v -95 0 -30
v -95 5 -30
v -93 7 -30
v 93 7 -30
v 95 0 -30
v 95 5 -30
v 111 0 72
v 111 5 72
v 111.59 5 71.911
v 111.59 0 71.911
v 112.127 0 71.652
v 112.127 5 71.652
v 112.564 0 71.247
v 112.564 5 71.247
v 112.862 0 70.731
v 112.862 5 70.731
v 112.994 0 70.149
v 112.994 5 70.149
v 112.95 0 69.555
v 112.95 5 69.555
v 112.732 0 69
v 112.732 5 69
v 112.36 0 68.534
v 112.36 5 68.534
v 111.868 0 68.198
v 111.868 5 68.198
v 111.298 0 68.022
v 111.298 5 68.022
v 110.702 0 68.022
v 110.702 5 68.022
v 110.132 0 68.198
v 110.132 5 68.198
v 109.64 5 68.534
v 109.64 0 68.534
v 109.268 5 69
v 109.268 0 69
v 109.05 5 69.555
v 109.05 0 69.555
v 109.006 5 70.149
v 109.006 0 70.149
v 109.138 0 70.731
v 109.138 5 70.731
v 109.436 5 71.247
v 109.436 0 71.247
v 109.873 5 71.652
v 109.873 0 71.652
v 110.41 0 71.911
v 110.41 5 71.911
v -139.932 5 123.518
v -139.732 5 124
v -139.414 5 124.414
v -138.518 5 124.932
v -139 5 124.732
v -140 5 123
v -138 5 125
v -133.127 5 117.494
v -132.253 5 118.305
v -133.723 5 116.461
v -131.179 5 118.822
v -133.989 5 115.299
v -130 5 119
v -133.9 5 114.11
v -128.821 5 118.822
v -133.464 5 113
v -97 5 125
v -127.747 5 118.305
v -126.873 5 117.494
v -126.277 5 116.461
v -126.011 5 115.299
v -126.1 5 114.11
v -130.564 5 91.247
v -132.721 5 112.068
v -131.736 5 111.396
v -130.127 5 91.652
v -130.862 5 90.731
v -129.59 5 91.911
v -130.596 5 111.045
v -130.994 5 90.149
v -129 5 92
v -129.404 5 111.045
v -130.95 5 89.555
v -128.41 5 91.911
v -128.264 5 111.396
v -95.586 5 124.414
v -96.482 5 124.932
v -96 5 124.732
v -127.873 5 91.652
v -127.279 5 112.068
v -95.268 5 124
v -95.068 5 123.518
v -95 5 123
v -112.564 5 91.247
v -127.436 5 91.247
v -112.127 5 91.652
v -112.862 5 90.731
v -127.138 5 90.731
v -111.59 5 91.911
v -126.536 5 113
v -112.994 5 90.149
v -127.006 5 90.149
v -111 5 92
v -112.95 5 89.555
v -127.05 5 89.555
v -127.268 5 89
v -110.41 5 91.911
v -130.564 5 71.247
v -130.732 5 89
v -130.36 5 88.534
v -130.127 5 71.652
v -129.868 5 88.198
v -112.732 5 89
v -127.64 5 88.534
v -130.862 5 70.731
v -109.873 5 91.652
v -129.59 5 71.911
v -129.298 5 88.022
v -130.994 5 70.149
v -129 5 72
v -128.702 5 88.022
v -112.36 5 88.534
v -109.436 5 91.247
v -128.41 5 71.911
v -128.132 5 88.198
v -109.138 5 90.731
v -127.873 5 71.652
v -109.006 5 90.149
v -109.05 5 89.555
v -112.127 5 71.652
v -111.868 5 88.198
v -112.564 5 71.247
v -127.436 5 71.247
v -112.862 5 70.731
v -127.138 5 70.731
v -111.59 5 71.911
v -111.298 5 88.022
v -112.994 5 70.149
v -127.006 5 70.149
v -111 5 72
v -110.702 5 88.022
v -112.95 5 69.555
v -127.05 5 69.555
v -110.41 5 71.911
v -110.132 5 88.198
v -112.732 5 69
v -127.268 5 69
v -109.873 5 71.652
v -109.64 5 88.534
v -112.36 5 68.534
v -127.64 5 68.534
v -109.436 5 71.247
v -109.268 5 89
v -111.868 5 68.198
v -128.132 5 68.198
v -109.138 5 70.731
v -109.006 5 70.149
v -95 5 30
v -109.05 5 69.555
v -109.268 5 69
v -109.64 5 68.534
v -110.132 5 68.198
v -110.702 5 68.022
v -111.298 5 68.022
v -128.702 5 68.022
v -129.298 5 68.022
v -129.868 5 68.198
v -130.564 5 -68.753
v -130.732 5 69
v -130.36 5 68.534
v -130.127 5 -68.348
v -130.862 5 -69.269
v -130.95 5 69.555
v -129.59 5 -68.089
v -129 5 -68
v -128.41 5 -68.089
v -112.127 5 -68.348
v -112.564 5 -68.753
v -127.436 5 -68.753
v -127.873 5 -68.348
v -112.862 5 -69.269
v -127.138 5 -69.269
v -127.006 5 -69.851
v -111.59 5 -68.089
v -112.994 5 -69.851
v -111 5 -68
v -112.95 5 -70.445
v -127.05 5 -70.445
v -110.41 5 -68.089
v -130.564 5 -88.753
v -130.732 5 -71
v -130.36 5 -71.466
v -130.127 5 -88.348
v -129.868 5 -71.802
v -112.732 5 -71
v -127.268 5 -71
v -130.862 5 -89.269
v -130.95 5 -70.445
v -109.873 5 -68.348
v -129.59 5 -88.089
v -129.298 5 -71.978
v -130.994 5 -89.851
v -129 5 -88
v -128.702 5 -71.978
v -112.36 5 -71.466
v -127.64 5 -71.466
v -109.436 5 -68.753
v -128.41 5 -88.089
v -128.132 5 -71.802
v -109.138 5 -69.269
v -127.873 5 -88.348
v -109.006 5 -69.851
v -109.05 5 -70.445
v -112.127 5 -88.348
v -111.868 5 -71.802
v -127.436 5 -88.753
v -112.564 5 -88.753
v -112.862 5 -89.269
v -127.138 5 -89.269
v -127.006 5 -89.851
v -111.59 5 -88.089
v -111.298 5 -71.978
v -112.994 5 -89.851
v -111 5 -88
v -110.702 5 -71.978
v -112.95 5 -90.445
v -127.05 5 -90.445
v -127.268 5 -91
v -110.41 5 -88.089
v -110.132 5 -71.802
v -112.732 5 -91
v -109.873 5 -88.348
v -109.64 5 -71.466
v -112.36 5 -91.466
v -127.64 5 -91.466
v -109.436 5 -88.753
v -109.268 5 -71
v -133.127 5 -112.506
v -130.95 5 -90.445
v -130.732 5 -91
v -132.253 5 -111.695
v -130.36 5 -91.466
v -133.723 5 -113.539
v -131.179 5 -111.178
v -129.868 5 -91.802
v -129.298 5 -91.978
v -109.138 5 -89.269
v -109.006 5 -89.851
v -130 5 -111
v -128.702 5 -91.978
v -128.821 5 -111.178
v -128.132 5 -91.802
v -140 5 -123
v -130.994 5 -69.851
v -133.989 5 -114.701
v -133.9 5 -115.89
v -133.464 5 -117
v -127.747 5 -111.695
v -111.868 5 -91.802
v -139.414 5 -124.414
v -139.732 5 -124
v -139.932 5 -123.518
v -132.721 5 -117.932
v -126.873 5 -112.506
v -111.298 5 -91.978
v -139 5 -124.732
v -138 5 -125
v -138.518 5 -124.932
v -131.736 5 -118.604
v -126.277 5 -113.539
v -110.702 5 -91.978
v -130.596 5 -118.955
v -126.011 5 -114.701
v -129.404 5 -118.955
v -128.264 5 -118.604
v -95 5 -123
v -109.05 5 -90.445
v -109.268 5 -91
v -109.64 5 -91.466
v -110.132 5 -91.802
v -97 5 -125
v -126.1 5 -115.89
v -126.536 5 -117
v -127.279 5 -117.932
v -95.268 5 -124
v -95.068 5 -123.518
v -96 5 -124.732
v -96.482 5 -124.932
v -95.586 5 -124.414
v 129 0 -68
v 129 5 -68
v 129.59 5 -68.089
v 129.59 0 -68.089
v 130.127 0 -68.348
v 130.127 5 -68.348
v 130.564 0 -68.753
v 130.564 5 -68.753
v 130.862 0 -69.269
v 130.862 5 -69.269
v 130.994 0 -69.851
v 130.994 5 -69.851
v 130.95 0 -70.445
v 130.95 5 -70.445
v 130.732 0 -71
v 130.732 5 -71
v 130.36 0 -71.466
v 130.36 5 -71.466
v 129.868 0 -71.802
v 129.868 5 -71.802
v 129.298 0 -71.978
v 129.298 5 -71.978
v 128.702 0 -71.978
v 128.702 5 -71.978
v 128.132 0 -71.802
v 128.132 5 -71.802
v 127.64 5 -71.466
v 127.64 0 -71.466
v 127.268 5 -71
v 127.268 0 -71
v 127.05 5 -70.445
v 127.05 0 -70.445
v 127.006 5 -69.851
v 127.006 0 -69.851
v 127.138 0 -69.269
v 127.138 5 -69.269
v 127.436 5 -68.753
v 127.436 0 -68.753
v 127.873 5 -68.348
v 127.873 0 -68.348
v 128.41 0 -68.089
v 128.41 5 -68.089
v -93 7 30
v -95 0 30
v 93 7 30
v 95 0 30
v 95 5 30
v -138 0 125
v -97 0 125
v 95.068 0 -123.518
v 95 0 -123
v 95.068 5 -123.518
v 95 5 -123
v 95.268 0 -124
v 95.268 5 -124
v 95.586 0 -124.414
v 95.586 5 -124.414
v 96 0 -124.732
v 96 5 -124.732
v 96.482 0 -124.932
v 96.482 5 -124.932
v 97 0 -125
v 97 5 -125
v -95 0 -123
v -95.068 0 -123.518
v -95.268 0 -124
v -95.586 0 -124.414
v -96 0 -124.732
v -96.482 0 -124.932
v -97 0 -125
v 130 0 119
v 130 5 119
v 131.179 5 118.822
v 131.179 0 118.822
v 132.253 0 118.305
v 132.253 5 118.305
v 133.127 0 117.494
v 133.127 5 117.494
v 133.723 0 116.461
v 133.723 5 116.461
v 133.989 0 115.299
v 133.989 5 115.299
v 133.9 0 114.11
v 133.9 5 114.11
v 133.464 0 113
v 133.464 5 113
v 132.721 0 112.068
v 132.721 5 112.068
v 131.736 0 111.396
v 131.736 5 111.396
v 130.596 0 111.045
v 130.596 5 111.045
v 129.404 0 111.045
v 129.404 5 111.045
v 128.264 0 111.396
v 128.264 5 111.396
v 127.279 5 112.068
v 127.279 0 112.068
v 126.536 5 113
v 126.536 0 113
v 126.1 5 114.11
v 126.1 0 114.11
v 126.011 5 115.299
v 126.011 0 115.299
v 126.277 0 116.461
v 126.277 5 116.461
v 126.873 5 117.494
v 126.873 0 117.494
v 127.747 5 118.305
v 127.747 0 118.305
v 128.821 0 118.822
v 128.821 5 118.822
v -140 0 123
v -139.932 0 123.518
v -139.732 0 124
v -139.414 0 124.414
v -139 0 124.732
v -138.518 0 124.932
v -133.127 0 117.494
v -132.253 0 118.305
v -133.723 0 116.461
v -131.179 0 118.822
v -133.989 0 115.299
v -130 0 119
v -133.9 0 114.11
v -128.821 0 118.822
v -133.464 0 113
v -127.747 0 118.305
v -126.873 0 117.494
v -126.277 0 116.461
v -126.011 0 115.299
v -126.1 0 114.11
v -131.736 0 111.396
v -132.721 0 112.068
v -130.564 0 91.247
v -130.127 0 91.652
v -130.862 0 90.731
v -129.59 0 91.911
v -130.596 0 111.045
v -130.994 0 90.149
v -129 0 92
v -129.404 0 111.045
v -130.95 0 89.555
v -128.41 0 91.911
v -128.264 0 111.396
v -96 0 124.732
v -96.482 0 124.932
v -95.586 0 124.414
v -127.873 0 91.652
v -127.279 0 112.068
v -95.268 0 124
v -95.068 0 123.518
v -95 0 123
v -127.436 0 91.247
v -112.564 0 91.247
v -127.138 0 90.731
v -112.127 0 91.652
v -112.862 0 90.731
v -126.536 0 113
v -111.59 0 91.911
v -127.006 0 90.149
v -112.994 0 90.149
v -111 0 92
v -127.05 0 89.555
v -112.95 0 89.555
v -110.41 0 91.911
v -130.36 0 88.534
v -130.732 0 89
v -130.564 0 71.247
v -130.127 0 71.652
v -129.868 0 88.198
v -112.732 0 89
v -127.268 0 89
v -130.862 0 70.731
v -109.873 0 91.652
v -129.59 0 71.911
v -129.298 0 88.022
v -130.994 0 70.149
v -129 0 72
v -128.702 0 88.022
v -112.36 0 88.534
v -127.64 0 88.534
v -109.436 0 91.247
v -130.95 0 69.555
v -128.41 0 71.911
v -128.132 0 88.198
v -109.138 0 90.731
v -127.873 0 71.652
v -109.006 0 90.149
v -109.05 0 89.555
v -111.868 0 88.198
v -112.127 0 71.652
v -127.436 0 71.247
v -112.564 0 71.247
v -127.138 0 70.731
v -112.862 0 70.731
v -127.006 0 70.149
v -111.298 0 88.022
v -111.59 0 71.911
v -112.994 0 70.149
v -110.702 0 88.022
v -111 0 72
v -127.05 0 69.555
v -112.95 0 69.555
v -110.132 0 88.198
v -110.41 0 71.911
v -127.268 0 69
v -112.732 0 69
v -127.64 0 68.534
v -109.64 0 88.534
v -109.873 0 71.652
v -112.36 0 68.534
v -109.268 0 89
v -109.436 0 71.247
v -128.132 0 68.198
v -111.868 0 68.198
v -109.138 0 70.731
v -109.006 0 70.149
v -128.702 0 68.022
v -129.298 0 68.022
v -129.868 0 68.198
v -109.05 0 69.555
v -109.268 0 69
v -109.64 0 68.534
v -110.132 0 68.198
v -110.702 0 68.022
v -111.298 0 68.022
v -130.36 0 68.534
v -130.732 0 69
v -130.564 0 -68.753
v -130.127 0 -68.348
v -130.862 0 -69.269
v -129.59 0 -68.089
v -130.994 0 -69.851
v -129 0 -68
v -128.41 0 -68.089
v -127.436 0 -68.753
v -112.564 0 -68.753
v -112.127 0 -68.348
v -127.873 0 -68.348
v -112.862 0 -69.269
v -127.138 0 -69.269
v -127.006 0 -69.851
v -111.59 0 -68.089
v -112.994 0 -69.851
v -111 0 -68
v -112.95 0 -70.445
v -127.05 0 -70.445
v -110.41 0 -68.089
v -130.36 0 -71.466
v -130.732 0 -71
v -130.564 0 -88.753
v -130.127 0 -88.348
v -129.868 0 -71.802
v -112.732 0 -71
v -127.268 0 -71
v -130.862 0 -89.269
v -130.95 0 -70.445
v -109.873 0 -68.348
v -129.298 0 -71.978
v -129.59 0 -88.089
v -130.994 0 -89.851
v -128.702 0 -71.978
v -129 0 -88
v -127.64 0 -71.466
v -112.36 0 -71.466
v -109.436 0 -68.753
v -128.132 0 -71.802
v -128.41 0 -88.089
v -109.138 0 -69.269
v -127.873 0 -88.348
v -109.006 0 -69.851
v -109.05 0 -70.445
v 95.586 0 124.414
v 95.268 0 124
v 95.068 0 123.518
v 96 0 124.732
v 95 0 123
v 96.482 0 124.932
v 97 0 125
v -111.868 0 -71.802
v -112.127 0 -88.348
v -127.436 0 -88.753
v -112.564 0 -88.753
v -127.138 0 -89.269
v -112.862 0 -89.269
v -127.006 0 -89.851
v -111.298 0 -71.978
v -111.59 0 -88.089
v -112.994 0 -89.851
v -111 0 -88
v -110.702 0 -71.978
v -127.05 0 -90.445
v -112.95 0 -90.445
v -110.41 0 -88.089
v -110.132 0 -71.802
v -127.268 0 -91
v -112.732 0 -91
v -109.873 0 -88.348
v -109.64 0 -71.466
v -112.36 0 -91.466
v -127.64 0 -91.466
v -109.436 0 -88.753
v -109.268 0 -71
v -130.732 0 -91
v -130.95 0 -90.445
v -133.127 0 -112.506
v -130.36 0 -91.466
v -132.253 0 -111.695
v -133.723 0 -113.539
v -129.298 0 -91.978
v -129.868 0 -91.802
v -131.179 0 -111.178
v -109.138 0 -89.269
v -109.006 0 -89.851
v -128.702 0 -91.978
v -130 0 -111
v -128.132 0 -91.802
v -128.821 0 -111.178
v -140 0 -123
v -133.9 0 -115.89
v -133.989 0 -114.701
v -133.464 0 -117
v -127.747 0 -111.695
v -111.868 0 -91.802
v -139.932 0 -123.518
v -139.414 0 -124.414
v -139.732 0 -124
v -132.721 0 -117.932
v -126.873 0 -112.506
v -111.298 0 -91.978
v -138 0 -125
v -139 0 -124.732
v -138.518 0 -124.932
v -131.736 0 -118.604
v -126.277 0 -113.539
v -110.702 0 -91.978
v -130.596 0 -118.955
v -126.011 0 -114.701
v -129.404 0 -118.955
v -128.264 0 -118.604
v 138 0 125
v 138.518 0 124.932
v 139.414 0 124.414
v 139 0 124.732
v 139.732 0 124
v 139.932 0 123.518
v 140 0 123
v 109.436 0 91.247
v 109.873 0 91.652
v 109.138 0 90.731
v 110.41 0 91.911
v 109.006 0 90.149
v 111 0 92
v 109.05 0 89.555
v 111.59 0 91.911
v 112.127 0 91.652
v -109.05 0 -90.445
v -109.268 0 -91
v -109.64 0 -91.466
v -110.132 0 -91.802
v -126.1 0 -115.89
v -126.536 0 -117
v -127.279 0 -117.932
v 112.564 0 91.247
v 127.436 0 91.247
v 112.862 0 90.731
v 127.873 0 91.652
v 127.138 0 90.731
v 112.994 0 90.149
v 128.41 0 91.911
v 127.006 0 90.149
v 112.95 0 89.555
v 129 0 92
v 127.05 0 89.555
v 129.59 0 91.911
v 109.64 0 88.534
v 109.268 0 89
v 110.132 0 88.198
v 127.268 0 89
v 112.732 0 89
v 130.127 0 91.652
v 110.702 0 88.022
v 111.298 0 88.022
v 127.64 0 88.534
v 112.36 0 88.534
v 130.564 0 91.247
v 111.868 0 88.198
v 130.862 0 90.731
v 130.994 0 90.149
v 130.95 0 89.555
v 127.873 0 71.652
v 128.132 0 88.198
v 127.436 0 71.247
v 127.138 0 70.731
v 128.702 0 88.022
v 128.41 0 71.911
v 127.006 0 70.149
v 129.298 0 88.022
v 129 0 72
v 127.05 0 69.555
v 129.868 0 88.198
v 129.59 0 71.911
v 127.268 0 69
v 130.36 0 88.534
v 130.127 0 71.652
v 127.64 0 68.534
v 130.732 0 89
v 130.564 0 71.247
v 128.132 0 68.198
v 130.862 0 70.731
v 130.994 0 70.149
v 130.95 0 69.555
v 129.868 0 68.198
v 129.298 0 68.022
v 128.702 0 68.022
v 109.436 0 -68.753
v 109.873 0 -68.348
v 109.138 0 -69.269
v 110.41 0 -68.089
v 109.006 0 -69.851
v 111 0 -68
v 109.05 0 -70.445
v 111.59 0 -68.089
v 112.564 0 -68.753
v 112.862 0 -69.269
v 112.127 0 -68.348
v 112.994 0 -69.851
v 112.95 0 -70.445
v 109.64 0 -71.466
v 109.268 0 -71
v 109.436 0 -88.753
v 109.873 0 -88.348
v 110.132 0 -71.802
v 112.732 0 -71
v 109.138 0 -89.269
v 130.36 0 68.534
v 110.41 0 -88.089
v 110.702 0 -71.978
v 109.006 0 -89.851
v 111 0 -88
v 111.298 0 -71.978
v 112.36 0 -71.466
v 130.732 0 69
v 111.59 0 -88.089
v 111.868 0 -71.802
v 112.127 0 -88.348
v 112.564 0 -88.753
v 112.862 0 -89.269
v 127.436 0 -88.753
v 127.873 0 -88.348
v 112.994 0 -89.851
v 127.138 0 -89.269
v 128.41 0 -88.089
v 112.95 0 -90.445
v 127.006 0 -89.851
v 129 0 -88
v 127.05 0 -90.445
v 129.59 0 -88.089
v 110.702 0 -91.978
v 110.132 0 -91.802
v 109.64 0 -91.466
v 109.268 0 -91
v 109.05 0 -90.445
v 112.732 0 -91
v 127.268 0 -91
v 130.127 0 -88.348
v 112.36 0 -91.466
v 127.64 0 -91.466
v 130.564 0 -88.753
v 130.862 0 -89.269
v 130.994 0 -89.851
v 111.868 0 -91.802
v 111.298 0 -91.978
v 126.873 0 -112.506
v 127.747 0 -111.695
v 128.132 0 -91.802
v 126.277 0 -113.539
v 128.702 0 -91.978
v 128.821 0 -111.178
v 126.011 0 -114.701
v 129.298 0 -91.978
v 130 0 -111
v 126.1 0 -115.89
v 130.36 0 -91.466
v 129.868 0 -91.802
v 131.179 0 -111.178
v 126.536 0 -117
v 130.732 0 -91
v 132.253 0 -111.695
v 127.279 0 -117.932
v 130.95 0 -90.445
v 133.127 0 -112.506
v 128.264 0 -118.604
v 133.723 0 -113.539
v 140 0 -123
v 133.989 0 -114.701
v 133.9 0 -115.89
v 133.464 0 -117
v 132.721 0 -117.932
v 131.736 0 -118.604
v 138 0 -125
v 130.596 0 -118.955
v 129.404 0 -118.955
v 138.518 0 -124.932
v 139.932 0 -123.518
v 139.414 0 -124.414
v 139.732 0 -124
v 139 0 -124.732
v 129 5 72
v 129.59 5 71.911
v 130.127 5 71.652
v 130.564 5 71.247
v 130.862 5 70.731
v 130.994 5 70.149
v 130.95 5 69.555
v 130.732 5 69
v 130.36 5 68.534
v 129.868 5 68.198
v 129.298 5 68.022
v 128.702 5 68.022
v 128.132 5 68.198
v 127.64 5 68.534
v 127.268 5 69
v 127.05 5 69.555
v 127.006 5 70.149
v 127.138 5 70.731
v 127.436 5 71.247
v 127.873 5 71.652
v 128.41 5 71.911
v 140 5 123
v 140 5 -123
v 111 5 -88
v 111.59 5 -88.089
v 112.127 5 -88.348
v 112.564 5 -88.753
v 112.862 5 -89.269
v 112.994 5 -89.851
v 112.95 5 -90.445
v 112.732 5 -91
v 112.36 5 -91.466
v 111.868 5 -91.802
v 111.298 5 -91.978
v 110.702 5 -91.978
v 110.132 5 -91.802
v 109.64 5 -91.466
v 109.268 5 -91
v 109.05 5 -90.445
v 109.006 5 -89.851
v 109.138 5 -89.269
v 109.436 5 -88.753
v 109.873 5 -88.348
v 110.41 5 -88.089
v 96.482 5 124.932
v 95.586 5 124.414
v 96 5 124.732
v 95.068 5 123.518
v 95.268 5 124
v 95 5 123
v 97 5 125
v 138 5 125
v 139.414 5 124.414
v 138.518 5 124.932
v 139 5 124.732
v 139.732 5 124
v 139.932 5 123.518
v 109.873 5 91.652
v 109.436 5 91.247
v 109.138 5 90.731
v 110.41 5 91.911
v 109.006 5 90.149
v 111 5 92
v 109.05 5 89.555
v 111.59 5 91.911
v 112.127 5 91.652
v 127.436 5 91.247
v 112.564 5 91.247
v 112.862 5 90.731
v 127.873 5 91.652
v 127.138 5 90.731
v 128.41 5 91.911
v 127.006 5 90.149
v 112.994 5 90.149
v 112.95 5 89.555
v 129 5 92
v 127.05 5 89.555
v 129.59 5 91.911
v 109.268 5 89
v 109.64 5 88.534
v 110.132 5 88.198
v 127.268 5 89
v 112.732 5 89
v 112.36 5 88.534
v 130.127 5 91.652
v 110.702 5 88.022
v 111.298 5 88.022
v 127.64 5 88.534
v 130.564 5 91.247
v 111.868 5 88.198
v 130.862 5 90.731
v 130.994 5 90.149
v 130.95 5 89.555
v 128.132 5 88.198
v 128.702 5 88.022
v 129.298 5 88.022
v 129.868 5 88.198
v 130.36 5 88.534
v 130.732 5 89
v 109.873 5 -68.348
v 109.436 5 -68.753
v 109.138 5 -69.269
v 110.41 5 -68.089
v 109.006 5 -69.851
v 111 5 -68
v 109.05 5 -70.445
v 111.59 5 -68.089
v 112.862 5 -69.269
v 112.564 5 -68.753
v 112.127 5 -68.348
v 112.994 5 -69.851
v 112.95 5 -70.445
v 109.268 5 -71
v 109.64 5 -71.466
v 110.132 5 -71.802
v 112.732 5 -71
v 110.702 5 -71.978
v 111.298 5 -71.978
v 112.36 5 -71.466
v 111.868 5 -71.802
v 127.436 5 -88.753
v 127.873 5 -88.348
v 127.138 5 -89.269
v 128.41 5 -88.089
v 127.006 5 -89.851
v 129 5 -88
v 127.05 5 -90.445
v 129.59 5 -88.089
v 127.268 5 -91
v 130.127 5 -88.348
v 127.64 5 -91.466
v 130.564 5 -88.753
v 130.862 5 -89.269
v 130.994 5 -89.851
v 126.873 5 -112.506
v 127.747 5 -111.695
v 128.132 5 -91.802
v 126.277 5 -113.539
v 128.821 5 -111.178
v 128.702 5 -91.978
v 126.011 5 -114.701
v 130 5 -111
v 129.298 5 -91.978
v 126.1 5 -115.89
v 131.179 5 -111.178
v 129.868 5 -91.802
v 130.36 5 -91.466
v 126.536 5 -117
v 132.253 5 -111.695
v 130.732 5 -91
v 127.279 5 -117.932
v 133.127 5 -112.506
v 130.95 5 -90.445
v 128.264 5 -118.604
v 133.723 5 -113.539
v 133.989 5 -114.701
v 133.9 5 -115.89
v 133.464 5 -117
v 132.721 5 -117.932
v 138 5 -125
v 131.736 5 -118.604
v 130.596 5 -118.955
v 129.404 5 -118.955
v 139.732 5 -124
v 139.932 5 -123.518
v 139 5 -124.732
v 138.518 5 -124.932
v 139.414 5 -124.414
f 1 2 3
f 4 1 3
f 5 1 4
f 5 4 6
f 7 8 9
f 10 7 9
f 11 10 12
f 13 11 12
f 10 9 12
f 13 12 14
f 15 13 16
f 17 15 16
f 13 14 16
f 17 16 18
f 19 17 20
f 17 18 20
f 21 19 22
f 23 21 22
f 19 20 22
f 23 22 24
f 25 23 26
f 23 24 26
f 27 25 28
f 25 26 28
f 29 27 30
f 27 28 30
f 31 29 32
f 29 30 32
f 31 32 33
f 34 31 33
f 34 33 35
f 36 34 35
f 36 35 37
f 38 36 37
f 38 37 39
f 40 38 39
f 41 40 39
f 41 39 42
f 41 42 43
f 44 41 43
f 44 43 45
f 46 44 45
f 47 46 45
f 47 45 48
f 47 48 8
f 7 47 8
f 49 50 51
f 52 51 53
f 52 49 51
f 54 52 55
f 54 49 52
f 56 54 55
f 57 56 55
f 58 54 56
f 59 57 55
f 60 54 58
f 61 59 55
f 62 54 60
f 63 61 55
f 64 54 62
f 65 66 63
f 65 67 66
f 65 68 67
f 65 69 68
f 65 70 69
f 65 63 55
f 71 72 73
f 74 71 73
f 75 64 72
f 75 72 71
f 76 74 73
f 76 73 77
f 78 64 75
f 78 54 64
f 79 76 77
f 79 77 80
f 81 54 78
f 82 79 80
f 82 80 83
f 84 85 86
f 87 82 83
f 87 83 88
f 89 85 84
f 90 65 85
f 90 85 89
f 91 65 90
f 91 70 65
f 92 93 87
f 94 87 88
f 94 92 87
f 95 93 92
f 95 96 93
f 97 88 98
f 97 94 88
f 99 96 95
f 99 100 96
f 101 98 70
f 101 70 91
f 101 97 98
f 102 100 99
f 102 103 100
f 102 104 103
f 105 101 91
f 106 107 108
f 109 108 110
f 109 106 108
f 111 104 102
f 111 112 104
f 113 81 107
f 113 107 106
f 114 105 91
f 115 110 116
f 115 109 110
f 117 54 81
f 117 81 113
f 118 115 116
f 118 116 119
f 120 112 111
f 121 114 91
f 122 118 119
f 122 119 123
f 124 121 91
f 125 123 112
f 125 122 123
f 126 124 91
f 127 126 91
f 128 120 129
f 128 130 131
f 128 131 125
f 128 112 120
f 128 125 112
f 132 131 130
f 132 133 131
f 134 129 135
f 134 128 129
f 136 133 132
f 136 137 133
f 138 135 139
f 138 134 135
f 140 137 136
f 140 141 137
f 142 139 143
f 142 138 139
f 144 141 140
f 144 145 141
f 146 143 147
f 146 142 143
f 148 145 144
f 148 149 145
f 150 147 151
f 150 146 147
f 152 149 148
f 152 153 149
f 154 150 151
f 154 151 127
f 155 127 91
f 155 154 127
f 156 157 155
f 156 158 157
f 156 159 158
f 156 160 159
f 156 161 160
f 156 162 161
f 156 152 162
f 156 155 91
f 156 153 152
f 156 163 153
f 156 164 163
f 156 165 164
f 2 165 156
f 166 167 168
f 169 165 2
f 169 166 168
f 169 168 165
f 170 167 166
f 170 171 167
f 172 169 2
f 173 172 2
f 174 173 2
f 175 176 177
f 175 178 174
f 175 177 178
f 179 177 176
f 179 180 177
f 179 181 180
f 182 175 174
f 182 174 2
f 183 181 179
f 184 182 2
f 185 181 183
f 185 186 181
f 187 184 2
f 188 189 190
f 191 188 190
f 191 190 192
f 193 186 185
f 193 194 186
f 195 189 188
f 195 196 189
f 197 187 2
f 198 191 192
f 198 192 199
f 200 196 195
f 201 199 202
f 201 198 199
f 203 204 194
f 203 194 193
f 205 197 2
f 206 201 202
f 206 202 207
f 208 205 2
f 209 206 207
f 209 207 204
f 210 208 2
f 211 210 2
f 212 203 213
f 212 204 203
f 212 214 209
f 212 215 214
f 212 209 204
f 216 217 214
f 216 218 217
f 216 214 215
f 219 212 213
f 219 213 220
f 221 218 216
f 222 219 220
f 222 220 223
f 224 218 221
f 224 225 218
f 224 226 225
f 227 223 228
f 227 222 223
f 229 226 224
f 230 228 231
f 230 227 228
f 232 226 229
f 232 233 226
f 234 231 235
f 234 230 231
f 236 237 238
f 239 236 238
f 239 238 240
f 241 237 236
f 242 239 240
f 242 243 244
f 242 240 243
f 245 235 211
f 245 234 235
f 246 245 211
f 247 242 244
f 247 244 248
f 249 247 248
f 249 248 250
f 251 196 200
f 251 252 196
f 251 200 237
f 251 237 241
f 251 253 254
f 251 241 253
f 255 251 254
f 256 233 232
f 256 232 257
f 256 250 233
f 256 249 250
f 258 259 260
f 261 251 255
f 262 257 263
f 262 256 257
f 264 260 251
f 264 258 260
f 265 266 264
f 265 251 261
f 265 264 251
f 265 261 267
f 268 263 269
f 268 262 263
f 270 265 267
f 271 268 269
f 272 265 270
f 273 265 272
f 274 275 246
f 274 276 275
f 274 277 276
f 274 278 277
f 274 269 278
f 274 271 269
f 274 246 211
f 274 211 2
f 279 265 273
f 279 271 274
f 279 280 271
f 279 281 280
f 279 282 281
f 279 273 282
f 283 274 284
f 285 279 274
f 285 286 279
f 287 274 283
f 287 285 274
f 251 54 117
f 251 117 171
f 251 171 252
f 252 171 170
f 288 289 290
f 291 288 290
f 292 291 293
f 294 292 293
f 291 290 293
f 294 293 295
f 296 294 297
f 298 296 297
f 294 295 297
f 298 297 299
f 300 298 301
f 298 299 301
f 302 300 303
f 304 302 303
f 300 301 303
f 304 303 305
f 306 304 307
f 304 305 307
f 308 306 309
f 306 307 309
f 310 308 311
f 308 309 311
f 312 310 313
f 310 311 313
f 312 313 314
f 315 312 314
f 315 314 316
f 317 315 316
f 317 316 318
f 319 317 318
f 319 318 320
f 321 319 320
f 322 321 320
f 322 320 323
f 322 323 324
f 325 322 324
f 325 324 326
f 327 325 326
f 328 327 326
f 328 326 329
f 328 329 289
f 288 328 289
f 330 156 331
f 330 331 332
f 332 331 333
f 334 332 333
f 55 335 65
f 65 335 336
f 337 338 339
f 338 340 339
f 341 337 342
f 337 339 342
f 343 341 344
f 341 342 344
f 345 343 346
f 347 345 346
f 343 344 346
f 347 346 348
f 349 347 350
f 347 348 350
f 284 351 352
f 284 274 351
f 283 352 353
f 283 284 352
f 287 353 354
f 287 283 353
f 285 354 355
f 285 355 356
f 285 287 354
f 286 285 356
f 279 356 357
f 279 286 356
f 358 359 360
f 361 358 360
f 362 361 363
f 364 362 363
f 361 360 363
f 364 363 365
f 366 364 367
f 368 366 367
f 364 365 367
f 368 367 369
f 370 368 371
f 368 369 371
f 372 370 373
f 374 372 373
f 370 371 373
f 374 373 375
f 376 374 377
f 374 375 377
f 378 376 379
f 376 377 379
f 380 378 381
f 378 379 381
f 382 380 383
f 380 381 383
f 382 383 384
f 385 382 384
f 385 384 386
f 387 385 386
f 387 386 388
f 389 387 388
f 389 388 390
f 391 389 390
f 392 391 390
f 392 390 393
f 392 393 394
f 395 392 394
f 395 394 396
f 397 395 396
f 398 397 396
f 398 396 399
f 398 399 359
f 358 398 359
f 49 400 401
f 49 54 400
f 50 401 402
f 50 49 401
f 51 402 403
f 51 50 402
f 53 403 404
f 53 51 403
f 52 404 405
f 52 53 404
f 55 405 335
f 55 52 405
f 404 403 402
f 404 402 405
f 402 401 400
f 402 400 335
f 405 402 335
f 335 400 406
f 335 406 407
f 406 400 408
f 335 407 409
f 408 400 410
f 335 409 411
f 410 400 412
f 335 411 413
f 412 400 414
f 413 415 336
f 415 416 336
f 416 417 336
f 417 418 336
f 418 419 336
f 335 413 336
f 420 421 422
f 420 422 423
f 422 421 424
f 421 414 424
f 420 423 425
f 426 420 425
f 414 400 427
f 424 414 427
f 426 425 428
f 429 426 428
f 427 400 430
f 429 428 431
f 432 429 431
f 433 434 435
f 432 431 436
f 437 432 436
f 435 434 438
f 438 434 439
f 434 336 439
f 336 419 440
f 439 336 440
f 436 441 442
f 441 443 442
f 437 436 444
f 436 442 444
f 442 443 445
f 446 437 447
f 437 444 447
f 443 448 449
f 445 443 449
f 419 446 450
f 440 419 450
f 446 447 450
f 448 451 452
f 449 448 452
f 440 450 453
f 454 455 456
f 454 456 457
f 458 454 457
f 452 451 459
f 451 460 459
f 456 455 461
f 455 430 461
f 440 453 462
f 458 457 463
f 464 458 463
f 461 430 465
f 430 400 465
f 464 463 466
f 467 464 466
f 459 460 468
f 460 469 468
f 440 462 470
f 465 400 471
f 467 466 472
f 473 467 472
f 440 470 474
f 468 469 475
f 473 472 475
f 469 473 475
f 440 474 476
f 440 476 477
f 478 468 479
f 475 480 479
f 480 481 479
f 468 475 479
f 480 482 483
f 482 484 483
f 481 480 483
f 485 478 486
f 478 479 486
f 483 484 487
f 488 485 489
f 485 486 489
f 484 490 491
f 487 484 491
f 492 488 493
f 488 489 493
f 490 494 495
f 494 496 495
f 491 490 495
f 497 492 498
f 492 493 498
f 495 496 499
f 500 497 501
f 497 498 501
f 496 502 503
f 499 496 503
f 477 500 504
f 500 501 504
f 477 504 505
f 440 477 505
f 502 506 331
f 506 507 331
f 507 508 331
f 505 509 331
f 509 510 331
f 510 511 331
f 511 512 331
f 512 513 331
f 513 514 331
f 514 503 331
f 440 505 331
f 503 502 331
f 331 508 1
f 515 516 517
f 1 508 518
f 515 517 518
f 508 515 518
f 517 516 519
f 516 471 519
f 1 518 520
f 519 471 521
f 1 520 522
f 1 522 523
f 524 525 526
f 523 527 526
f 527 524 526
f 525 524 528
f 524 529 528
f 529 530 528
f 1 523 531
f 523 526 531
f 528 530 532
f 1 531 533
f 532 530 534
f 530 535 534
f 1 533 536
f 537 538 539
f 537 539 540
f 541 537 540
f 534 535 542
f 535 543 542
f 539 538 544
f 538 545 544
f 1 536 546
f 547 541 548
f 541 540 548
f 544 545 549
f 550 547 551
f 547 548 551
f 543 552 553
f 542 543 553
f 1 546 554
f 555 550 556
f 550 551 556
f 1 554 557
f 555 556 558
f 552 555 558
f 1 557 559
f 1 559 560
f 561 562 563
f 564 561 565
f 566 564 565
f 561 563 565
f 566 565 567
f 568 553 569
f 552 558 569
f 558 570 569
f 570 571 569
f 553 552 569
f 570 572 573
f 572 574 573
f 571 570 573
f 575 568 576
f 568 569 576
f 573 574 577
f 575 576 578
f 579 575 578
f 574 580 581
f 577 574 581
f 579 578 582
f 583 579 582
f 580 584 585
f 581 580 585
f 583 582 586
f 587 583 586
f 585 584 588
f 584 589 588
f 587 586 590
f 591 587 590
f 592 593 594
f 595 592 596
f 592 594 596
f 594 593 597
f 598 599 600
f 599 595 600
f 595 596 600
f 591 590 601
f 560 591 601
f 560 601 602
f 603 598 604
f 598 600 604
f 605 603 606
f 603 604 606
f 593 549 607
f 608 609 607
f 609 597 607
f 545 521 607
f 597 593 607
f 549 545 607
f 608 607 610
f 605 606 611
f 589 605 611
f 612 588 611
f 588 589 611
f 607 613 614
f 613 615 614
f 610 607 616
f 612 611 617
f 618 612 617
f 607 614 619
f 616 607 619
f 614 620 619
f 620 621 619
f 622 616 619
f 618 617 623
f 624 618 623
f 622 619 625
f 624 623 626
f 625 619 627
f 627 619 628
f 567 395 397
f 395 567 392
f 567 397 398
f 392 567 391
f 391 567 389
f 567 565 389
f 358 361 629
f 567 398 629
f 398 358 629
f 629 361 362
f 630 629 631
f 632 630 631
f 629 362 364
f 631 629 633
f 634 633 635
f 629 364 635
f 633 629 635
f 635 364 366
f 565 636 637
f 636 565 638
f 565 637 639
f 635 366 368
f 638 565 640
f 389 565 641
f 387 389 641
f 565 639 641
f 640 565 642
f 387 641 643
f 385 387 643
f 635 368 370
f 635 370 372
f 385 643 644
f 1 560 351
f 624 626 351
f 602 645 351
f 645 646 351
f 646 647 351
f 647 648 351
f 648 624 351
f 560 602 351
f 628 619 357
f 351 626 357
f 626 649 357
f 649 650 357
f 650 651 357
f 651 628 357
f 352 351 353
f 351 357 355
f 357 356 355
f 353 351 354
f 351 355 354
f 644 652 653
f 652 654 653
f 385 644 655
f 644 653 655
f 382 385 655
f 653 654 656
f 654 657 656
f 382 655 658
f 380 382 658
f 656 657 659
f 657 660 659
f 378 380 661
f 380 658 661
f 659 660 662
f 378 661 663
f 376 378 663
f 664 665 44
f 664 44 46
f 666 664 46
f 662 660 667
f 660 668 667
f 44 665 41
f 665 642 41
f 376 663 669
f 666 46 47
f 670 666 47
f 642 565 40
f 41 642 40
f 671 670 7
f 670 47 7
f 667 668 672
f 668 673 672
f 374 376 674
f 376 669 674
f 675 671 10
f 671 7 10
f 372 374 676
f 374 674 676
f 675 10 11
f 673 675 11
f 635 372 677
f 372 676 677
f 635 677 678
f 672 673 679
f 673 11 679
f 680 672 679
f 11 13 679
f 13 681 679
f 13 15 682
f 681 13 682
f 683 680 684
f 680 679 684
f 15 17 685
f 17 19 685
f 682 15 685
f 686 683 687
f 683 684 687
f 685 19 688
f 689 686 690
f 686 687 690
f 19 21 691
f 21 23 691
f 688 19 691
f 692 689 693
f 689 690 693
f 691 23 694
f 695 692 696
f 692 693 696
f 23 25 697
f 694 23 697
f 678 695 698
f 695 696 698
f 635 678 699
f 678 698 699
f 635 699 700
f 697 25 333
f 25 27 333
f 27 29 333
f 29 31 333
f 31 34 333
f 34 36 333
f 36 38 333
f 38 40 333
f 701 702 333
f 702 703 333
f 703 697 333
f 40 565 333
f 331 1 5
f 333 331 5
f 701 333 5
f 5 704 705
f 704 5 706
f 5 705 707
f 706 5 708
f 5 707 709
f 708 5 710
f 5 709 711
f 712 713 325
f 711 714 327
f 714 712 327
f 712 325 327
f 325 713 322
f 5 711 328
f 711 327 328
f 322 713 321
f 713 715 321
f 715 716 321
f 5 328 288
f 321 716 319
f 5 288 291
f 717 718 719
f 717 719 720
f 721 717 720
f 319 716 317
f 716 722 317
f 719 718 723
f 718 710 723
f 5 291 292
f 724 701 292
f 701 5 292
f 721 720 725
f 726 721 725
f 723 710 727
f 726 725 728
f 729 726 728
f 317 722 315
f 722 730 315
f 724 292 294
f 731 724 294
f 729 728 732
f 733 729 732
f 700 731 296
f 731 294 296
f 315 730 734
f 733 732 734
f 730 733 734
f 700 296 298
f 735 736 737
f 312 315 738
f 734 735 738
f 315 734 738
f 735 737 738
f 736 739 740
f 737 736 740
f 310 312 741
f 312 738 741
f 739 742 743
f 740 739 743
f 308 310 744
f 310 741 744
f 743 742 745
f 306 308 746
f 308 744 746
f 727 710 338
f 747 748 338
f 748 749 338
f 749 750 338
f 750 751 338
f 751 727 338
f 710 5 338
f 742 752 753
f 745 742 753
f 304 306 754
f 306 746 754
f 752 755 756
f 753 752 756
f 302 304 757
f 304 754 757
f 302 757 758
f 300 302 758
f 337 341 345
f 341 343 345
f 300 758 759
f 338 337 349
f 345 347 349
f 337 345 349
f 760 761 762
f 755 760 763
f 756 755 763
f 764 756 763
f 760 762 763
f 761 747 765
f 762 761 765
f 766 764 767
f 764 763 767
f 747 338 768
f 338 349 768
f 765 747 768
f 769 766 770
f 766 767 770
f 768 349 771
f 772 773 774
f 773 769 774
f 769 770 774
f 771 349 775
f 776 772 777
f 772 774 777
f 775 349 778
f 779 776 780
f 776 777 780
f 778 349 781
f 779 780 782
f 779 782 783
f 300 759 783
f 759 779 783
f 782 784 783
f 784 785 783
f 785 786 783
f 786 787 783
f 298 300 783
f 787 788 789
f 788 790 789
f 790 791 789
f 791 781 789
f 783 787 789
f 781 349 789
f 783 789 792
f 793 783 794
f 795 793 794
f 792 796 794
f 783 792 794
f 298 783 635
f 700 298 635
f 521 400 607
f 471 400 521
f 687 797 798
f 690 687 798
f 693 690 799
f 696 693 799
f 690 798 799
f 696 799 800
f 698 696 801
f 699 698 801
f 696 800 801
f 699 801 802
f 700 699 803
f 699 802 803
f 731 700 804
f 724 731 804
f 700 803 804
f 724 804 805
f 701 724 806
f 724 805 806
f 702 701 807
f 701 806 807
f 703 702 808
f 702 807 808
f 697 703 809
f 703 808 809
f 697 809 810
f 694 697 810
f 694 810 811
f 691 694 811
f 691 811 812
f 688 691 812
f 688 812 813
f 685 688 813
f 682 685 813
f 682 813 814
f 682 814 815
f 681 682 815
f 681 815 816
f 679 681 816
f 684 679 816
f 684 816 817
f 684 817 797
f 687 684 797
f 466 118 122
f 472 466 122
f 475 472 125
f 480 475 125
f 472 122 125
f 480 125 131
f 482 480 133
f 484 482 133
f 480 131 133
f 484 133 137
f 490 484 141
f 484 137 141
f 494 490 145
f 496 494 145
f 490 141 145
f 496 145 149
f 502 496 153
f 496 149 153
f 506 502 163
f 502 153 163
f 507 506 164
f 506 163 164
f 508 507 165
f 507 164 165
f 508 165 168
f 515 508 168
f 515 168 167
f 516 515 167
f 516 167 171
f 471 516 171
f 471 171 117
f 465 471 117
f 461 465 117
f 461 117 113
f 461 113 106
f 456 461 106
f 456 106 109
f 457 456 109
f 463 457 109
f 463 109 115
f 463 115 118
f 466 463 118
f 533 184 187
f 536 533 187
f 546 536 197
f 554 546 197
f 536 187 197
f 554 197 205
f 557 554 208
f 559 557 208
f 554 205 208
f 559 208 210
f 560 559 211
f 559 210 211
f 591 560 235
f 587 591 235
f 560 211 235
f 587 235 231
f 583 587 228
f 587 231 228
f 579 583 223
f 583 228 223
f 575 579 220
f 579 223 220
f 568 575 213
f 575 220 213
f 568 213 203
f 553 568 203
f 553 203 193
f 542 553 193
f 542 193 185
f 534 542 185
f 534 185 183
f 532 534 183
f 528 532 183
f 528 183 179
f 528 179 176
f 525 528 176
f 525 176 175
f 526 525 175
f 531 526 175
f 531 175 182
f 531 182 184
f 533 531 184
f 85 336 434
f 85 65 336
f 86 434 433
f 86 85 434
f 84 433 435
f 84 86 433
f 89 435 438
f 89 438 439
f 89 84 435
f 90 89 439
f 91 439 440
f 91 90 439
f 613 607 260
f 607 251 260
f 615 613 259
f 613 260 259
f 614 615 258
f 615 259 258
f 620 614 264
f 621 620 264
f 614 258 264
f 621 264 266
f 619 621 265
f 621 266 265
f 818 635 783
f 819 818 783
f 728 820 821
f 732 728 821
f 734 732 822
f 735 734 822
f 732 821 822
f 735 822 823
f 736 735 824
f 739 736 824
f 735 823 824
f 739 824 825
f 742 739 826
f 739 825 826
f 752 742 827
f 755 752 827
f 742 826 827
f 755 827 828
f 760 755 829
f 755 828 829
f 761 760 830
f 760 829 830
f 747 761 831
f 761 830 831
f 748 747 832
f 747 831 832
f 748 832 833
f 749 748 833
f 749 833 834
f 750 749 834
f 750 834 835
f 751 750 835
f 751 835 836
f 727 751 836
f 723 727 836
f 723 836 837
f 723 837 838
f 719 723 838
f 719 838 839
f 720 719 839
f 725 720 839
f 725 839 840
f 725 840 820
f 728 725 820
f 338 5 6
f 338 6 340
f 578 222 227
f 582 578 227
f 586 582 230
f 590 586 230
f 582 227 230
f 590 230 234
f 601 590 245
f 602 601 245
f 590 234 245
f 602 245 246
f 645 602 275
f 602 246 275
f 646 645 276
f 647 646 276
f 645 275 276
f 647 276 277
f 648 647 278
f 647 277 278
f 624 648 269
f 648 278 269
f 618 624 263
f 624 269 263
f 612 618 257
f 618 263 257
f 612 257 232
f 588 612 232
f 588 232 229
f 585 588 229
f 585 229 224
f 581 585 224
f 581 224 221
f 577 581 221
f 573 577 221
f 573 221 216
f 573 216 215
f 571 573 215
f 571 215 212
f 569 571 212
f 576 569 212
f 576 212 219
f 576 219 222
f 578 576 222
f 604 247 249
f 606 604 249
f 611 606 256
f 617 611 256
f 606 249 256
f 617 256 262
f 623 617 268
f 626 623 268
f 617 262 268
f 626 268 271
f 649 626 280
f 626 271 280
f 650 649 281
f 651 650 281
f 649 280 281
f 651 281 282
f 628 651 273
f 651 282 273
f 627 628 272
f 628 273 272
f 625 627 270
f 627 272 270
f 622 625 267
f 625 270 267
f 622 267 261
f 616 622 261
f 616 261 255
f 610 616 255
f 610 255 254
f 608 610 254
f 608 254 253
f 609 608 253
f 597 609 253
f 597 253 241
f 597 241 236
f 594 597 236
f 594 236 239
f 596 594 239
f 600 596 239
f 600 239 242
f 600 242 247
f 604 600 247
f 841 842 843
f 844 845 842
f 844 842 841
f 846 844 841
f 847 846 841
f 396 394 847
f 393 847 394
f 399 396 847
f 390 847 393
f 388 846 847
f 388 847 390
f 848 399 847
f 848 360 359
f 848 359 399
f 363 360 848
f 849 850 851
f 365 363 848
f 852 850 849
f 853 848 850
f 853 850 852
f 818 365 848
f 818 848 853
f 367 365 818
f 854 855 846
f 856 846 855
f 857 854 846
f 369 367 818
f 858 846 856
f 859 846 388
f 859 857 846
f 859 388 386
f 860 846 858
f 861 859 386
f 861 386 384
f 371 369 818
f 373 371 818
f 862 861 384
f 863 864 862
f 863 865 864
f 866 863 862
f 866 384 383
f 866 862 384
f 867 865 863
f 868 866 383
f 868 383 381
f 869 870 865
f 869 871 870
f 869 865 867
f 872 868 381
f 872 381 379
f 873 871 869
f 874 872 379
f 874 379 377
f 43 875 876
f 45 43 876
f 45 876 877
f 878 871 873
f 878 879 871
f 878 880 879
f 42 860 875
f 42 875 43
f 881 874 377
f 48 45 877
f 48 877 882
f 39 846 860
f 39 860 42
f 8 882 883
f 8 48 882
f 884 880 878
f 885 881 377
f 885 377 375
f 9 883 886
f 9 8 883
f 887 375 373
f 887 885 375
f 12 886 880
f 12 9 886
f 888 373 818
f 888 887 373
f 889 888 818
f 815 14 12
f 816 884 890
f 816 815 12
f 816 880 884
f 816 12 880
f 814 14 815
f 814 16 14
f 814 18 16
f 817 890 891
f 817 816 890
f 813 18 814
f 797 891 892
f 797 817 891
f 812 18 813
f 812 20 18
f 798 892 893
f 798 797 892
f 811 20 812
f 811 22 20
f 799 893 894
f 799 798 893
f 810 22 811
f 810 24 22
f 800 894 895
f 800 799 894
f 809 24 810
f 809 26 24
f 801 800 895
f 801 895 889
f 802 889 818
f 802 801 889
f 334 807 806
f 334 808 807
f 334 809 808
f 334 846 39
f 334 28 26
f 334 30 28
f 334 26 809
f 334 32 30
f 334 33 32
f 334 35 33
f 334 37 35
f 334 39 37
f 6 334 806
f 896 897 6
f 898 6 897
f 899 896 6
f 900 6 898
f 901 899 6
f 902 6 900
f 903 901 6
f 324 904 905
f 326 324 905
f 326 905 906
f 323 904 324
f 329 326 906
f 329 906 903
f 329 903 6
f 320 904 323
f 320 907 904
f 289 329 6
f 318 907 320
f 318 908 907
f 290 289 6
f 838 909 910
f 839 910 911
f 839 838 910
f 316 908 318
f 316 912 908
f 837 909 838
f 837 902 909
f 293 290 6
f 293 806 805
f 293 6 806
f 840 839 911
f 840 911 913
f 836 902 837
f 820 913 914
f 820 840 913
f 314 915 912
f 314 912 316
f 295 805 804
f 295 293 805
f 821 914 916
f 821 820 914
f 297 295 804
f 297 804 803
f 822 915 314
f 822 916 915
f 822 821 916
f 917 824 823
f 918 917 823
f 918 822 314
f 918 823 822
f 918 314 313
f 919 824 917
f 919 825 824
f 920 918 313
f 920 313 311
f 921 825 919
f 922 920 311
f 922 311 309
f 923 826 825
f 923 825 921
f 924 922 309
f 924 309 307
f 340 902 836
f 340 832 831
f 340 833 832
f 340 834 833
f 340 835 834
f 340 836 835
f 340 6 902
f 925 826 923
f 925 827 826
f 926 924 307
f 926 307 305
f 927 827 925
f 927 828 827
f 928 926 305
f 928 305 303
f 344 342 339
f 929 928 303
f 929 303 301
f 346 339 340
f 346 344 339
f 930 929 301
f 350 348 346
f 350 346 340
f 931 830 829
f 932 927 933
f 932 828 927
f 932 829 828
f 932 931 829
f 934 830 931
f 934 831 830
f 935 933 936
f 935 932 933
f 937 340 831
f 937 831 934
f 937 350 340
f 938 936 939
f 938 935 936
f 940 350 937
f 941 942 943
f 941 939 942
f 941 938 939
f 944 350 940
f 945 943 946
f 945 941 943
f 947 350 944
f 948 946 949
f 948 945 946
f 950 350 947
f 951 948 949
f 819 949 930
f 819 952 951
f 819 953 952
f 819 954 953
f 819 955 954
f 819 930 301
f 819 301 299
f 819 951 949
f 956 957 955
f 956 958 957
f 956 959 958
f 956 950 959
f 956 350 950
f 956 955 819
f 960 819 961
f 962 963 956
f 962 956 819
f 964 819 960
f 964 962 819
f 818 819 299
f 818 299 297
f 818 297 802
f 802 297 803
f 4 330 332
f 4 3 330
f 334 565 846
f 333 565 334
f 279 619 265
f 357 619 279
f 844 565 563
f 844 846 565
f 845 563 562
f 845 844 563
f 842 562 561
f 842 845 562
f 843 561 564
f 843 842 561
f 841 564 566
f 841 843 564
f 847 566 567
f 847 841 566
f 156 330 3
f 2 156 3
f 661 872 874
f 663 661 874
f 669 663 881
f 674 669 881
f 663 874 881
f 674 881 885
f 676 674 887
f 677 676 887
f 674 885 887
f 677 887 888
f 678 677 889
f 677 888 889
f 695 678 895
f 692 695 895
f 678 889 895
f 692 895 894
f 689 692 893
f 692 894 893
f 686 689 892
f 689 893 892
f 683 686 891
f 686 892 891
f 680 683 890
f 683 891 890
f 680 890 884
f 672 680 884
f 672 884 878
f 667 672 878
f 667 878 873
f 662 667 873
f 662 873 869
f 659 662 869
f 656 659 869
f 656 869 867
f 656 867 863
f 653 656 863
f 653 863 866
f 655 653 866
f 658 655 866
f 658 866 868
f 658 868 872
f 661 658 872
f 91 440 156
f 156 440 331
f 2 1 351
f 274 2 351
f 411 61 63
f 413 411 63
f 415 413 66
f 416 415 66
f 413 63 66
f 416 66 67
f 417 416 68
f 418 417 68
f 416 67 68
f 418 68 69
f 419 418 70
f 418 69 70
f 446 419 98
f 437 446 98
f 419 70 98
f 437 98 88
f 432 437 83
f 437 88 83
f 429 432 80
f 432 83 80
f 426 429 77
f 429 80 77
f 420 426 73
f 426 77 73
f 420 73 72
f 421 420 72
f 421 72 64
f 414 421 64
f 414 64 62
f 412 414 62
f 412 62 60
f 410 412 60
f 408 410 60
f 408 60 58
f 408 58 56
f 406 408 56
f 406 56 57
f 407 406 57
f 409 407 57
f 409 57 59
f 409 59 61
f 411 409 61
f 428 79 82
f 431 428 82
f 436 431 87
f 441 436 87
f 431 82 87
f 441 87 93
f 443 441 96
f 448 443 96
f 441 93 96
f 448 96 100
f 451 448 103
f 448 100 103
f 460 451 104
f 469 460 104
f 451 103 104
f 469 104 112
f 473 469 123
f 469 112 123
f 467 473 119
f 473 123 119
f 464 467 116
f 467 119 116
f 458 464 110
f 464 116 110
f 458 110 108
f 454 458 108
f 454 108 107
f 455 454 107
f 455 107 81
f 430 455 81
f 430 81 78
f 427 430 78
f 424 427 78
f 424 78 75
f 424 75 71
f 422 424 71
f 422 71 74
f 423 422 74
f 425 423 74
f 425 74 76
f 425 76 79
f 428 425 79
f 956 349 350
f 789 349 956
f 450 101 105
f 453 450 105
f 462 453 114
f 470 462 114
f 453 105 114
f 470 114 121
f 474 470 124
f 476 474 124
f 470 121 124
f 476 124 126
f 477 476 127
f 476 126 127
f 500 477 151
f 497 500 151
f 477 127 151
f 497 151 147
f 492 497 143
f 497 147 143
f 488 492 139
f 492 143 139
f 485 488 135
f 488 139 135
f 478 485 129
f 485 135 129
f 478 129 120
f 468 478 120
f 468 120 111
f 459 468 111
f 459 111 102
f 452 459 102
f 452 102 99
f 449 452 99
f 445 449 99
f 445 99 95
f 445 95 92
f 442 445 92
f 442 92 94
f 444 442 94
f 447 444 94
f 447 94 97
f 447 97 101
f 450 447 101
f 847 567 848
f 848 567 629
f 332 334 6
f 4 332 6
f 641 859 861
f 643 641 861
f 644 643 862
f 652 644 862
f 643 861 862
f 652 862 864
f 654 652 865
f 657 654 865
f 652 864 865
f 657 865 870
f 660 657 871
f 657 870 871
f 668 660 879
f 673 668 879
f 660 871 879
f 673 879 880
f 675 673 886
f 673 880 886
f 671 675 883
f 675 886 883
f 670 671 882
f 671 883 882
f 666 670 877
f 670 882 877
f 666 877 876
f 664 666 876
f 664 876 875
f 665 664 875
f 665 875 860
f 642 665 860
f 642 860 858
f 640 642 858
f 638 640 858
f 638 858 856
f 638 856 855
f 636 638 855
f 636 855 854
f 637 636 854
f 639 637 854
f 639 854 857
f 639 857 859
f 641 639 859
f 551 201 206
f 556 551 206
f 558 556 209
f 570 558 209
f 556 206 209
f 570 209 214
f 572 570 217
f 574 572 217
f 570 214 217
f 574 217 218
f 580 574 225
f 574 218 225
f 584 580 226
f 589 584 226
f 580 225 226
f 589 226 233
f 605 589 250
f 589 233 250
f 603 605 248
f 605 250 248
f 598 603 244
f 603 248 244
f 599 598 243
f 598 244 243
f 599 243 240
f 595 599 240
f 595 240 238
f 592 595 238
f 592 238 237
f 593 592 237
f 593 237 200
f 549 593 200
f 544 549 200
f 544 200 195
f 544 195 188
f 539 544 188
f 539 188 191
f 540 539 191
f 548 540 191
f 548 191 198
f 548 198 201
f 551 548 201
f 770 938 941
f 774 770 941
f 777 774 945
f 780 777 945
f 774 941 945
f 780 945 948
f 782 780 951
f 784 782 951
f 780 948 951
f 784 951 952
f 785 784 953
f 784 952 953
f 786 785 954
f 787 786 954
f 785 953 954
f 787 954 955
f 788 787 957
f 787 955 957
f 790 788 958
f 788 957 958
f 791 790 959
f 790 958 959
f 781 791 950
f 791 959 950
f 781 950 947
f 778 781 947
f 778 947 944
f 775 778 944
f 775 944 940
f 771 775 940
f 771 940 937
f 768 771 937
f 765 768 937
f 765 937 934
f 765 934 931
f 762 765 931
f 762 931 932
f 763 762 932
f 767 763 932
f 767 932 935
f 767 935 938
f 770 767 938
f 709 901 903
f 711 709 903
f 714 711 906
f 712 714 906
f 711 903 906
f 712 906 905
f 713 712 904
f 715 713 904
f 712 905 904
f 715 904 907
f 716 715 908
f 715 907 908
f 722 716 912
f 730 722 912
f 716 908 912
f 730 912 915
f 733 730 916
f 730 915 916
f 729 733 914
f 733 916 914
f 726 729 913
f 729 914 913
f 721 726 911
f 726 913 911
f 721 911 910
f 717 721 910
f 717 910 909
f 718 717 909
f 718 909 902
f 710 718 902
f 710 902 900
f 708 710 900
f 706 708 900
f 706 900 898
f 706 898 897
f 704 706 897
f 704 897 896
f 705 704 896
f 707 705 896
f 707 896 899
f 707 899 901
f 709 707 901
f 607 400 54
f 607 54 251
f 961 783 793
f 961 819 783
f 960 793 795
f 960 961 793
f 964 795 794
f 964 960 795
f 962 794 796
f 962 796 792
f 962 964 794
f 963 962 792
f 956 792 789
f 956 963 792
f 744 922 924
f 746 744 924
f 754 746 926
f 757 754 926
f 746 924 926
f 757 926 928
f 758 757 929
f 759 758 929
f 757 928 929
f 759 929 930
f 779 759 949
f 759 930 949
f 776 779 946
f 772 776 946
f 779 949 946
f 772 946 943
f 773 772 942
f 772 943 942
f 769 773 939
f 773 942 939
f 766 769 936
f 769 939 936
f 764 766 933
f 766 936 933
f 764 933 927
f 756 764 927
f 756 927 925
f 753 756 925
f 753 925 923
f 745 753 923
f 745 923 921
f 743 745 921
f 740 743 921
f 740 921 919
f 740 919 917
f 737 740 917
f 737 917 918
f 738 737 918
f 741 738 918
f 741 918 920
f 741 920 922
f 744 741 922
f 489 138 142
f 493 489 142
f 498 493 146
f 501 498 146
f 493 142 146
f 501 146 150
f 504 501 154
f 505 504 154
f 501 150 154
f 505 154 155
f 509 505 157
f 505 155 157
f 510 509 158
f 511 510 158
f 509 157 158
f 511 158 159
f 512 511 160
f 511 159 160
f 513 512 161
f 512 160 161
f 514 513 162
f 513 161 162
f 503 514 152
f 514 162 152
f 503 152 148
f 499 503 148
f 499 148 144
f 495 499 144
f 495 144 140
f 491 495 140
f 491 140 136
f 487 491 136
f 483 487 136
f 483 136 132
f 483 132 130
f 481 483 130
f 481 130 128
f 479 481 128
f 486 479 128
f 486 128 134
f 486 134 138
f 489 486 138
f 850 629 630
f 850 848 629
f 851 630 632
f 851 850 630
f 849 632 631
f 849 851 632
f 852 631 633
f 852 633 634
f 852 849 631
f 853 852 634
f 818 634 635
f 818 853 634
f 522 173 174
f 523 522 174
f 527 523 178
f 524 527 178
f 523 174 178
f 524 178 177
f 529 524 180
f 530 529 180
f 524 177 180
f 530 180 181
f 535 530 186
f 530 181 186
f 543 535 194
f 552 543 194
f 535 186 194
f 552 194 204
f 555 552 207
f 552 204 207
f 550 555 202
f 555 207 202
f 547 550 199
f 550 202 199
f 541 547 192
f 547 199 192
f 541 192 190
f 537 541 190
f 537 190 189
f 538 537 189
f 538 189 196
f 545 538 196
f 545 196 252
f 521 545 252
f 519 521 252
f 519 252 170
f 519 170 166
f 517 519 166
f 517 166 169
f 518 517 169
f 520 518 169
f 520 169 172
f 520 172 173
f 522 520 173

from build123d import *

# Parameters (mm, degrees)
SKETCH1_W             = 45
SKETCH1_H             = 250
BOSS_EXTRUDE1_DEPTH   = 5
BOSS_EXTRUDE1_2_DEPTH = 5
SKETCH2_W             = 190
SKETCH2_H             = 60
BOSS_EXTRUDE2_DEPTH   = 7
CHAMFER1_SIZE         = 2
FILLET1_R             = 2
SKETCH3_R             = 2
CUT_EXTRUDE1_DEPTH    = 188.749833555
LPATTERN1_COUNT       = 2
LPATTERN1_PITCH       = 240
LPATTERN1_COUNT_DIR2  = 2
LPATTERN1_PITCH_DIR2  = 160
SKETCH4_R             = 4
CUT_EXTRUDE2_DEPTH    = 188.749833555
LPATTERN2_COUNT       = 2
LPATTERN2_PITCH       = 260
LPATTERN2_COUNT_DIR2  = 2
LPATTERN2_PITCH_DIR2  = 230


with BuildPart() as part:
    # Sketch1 → Boss-Extrude1 (new body)
    with BuildSketch(Plane(origin=(0, 0, 0), x_dir=(1, 0, 0), z_dir=(0, 1, 0))):
        with Locations((-117.5, 0)):
            Rectangle(SKETCH1_W, SKETCH1_H)
    extrude(amount=BOSS_EXTRUDE1_DEPTH)



with BuildPart() as body_2:
    # Sketch1 → Boss-Extrude1 2 (new body)
    with BuildSketch(Plane(origin=(0, 0, 0), x_dir=(1, 0, 0), z_dir=(0, 1, 0))):
        with Locations((117.5, 0)):
            Rectangle(SKETCH1_W, SKETCH1_H)
    extrude(amount=BOSS_EXTRUDE1_2_DEPTH)


with BuildPart() as part_1:
    add(part.part)

    add(body_2.part)  # Boss-Extrude2 merges body 2
    # Sketch2 → Boss-Extrude2 (add)
    with BuildSketch(Plane(origin=(0, 0, 0), x_dir=(1, 0, 0), z_dir=(0, 1, 0))):
        Rectangle(SKETCH2_W, SKETCH2_H)
    extrude(amount=BOSS_EXTRUDE2_DEPTH)

    # Chamfer1
    chamfer1_edges = [part_1.edges().sort_by_distance(p)[0] for p in [
        (95, 7, 0),
        (-95, 7, 0),
    ]]
    chamfer(chamfer1_edges, length=CHAMFER1_SIZE - 0.0001)  # a hair under: the kernel refuses the full size

    # Fillet1
    fillet1_edges = [part_1.edges().sort_by_distance(p)[0] for p in [
        (95, 2.5, -125),
        (95, 2.5, 125),
        (140, 2.5, 125),
        (140, 2.5, -125),
        (-95, 2.5, -125),
        (-95, 2.5, 125),
        (-140, 2.5, 125),
        (-140, 2.5, -125),
    ]]
    fillet(fillet1_edges, radius=FILLET1_R)

    # Sketch3 → Cut-Extrude1 (cut, through all)
    with BuildSketch(Plane(origin=(0, 5, 0), x_dir=(1, 0, 0), z_dir=(0, 1, 0))):
        with Locations(Location((-129, 90, 0), (0, 0, 270))):
            Circle(SKETCH3_R)
        with Locations(Location((-111, 90, 0), (0, 0, 270))):
            Circle(SKETCH3_R)
        with Locations(Location((-129, 70, 0), (0, 0, 270))):
            Circle(SKETCH3_R)
        with Locations(Location((-111, 70, 0), (0, 0, 270))):
            Circle(SKETCH3_R)
    cut_extrude1 = extrude(amount=-CUT_EXTRUDE1_DEPTH, mode=Mode.SUBTRACT)

    # LPattern1: Cut-Extrude1 2 × 2
    with Locations(*[(i * LPATTERN1_PITCH, 0, j * LPATTERN1_PITCH_DIR2) for i in range(LPATTERN1_COUNT) for j in range(LPATTERN1_COUNT_DIR2) if (i, j) != (0, 0)]):
        add(cut_extrude1, mode=Mode.SUBTRACT)

    # Sketch4 → Cut-Extrude2 (cut, through all)
    with BuildSketch(Plane(origin=(0, 5, 0), x_dir=(1, 0, 0), z_dir=(0, 1, 0))):
        with Locations(Location((-130, 115, 0), (0, 0, 270))):
            Circle(SKETCH4_R)
    cut_extrude2 = extrude(amount=-CUT_EXTRUDE2_DEPTH, mode=Mode.SUBTRACT)

    # LPattern2: Cut-Extrude2 2 × 2
    with Locations(*[(i * LPATTERN2_PITCH, 0, j * LPATTERN2_PITCH_DIR2) for i in range(LPATTERN2_COUNT) for j in range(LPATTERN2_COUNT_DIR2) if (i, j) != (0, 0)]):
        add(cut_extrude2, mode=Mode.SUBTRACT)


solid = part_1.part
